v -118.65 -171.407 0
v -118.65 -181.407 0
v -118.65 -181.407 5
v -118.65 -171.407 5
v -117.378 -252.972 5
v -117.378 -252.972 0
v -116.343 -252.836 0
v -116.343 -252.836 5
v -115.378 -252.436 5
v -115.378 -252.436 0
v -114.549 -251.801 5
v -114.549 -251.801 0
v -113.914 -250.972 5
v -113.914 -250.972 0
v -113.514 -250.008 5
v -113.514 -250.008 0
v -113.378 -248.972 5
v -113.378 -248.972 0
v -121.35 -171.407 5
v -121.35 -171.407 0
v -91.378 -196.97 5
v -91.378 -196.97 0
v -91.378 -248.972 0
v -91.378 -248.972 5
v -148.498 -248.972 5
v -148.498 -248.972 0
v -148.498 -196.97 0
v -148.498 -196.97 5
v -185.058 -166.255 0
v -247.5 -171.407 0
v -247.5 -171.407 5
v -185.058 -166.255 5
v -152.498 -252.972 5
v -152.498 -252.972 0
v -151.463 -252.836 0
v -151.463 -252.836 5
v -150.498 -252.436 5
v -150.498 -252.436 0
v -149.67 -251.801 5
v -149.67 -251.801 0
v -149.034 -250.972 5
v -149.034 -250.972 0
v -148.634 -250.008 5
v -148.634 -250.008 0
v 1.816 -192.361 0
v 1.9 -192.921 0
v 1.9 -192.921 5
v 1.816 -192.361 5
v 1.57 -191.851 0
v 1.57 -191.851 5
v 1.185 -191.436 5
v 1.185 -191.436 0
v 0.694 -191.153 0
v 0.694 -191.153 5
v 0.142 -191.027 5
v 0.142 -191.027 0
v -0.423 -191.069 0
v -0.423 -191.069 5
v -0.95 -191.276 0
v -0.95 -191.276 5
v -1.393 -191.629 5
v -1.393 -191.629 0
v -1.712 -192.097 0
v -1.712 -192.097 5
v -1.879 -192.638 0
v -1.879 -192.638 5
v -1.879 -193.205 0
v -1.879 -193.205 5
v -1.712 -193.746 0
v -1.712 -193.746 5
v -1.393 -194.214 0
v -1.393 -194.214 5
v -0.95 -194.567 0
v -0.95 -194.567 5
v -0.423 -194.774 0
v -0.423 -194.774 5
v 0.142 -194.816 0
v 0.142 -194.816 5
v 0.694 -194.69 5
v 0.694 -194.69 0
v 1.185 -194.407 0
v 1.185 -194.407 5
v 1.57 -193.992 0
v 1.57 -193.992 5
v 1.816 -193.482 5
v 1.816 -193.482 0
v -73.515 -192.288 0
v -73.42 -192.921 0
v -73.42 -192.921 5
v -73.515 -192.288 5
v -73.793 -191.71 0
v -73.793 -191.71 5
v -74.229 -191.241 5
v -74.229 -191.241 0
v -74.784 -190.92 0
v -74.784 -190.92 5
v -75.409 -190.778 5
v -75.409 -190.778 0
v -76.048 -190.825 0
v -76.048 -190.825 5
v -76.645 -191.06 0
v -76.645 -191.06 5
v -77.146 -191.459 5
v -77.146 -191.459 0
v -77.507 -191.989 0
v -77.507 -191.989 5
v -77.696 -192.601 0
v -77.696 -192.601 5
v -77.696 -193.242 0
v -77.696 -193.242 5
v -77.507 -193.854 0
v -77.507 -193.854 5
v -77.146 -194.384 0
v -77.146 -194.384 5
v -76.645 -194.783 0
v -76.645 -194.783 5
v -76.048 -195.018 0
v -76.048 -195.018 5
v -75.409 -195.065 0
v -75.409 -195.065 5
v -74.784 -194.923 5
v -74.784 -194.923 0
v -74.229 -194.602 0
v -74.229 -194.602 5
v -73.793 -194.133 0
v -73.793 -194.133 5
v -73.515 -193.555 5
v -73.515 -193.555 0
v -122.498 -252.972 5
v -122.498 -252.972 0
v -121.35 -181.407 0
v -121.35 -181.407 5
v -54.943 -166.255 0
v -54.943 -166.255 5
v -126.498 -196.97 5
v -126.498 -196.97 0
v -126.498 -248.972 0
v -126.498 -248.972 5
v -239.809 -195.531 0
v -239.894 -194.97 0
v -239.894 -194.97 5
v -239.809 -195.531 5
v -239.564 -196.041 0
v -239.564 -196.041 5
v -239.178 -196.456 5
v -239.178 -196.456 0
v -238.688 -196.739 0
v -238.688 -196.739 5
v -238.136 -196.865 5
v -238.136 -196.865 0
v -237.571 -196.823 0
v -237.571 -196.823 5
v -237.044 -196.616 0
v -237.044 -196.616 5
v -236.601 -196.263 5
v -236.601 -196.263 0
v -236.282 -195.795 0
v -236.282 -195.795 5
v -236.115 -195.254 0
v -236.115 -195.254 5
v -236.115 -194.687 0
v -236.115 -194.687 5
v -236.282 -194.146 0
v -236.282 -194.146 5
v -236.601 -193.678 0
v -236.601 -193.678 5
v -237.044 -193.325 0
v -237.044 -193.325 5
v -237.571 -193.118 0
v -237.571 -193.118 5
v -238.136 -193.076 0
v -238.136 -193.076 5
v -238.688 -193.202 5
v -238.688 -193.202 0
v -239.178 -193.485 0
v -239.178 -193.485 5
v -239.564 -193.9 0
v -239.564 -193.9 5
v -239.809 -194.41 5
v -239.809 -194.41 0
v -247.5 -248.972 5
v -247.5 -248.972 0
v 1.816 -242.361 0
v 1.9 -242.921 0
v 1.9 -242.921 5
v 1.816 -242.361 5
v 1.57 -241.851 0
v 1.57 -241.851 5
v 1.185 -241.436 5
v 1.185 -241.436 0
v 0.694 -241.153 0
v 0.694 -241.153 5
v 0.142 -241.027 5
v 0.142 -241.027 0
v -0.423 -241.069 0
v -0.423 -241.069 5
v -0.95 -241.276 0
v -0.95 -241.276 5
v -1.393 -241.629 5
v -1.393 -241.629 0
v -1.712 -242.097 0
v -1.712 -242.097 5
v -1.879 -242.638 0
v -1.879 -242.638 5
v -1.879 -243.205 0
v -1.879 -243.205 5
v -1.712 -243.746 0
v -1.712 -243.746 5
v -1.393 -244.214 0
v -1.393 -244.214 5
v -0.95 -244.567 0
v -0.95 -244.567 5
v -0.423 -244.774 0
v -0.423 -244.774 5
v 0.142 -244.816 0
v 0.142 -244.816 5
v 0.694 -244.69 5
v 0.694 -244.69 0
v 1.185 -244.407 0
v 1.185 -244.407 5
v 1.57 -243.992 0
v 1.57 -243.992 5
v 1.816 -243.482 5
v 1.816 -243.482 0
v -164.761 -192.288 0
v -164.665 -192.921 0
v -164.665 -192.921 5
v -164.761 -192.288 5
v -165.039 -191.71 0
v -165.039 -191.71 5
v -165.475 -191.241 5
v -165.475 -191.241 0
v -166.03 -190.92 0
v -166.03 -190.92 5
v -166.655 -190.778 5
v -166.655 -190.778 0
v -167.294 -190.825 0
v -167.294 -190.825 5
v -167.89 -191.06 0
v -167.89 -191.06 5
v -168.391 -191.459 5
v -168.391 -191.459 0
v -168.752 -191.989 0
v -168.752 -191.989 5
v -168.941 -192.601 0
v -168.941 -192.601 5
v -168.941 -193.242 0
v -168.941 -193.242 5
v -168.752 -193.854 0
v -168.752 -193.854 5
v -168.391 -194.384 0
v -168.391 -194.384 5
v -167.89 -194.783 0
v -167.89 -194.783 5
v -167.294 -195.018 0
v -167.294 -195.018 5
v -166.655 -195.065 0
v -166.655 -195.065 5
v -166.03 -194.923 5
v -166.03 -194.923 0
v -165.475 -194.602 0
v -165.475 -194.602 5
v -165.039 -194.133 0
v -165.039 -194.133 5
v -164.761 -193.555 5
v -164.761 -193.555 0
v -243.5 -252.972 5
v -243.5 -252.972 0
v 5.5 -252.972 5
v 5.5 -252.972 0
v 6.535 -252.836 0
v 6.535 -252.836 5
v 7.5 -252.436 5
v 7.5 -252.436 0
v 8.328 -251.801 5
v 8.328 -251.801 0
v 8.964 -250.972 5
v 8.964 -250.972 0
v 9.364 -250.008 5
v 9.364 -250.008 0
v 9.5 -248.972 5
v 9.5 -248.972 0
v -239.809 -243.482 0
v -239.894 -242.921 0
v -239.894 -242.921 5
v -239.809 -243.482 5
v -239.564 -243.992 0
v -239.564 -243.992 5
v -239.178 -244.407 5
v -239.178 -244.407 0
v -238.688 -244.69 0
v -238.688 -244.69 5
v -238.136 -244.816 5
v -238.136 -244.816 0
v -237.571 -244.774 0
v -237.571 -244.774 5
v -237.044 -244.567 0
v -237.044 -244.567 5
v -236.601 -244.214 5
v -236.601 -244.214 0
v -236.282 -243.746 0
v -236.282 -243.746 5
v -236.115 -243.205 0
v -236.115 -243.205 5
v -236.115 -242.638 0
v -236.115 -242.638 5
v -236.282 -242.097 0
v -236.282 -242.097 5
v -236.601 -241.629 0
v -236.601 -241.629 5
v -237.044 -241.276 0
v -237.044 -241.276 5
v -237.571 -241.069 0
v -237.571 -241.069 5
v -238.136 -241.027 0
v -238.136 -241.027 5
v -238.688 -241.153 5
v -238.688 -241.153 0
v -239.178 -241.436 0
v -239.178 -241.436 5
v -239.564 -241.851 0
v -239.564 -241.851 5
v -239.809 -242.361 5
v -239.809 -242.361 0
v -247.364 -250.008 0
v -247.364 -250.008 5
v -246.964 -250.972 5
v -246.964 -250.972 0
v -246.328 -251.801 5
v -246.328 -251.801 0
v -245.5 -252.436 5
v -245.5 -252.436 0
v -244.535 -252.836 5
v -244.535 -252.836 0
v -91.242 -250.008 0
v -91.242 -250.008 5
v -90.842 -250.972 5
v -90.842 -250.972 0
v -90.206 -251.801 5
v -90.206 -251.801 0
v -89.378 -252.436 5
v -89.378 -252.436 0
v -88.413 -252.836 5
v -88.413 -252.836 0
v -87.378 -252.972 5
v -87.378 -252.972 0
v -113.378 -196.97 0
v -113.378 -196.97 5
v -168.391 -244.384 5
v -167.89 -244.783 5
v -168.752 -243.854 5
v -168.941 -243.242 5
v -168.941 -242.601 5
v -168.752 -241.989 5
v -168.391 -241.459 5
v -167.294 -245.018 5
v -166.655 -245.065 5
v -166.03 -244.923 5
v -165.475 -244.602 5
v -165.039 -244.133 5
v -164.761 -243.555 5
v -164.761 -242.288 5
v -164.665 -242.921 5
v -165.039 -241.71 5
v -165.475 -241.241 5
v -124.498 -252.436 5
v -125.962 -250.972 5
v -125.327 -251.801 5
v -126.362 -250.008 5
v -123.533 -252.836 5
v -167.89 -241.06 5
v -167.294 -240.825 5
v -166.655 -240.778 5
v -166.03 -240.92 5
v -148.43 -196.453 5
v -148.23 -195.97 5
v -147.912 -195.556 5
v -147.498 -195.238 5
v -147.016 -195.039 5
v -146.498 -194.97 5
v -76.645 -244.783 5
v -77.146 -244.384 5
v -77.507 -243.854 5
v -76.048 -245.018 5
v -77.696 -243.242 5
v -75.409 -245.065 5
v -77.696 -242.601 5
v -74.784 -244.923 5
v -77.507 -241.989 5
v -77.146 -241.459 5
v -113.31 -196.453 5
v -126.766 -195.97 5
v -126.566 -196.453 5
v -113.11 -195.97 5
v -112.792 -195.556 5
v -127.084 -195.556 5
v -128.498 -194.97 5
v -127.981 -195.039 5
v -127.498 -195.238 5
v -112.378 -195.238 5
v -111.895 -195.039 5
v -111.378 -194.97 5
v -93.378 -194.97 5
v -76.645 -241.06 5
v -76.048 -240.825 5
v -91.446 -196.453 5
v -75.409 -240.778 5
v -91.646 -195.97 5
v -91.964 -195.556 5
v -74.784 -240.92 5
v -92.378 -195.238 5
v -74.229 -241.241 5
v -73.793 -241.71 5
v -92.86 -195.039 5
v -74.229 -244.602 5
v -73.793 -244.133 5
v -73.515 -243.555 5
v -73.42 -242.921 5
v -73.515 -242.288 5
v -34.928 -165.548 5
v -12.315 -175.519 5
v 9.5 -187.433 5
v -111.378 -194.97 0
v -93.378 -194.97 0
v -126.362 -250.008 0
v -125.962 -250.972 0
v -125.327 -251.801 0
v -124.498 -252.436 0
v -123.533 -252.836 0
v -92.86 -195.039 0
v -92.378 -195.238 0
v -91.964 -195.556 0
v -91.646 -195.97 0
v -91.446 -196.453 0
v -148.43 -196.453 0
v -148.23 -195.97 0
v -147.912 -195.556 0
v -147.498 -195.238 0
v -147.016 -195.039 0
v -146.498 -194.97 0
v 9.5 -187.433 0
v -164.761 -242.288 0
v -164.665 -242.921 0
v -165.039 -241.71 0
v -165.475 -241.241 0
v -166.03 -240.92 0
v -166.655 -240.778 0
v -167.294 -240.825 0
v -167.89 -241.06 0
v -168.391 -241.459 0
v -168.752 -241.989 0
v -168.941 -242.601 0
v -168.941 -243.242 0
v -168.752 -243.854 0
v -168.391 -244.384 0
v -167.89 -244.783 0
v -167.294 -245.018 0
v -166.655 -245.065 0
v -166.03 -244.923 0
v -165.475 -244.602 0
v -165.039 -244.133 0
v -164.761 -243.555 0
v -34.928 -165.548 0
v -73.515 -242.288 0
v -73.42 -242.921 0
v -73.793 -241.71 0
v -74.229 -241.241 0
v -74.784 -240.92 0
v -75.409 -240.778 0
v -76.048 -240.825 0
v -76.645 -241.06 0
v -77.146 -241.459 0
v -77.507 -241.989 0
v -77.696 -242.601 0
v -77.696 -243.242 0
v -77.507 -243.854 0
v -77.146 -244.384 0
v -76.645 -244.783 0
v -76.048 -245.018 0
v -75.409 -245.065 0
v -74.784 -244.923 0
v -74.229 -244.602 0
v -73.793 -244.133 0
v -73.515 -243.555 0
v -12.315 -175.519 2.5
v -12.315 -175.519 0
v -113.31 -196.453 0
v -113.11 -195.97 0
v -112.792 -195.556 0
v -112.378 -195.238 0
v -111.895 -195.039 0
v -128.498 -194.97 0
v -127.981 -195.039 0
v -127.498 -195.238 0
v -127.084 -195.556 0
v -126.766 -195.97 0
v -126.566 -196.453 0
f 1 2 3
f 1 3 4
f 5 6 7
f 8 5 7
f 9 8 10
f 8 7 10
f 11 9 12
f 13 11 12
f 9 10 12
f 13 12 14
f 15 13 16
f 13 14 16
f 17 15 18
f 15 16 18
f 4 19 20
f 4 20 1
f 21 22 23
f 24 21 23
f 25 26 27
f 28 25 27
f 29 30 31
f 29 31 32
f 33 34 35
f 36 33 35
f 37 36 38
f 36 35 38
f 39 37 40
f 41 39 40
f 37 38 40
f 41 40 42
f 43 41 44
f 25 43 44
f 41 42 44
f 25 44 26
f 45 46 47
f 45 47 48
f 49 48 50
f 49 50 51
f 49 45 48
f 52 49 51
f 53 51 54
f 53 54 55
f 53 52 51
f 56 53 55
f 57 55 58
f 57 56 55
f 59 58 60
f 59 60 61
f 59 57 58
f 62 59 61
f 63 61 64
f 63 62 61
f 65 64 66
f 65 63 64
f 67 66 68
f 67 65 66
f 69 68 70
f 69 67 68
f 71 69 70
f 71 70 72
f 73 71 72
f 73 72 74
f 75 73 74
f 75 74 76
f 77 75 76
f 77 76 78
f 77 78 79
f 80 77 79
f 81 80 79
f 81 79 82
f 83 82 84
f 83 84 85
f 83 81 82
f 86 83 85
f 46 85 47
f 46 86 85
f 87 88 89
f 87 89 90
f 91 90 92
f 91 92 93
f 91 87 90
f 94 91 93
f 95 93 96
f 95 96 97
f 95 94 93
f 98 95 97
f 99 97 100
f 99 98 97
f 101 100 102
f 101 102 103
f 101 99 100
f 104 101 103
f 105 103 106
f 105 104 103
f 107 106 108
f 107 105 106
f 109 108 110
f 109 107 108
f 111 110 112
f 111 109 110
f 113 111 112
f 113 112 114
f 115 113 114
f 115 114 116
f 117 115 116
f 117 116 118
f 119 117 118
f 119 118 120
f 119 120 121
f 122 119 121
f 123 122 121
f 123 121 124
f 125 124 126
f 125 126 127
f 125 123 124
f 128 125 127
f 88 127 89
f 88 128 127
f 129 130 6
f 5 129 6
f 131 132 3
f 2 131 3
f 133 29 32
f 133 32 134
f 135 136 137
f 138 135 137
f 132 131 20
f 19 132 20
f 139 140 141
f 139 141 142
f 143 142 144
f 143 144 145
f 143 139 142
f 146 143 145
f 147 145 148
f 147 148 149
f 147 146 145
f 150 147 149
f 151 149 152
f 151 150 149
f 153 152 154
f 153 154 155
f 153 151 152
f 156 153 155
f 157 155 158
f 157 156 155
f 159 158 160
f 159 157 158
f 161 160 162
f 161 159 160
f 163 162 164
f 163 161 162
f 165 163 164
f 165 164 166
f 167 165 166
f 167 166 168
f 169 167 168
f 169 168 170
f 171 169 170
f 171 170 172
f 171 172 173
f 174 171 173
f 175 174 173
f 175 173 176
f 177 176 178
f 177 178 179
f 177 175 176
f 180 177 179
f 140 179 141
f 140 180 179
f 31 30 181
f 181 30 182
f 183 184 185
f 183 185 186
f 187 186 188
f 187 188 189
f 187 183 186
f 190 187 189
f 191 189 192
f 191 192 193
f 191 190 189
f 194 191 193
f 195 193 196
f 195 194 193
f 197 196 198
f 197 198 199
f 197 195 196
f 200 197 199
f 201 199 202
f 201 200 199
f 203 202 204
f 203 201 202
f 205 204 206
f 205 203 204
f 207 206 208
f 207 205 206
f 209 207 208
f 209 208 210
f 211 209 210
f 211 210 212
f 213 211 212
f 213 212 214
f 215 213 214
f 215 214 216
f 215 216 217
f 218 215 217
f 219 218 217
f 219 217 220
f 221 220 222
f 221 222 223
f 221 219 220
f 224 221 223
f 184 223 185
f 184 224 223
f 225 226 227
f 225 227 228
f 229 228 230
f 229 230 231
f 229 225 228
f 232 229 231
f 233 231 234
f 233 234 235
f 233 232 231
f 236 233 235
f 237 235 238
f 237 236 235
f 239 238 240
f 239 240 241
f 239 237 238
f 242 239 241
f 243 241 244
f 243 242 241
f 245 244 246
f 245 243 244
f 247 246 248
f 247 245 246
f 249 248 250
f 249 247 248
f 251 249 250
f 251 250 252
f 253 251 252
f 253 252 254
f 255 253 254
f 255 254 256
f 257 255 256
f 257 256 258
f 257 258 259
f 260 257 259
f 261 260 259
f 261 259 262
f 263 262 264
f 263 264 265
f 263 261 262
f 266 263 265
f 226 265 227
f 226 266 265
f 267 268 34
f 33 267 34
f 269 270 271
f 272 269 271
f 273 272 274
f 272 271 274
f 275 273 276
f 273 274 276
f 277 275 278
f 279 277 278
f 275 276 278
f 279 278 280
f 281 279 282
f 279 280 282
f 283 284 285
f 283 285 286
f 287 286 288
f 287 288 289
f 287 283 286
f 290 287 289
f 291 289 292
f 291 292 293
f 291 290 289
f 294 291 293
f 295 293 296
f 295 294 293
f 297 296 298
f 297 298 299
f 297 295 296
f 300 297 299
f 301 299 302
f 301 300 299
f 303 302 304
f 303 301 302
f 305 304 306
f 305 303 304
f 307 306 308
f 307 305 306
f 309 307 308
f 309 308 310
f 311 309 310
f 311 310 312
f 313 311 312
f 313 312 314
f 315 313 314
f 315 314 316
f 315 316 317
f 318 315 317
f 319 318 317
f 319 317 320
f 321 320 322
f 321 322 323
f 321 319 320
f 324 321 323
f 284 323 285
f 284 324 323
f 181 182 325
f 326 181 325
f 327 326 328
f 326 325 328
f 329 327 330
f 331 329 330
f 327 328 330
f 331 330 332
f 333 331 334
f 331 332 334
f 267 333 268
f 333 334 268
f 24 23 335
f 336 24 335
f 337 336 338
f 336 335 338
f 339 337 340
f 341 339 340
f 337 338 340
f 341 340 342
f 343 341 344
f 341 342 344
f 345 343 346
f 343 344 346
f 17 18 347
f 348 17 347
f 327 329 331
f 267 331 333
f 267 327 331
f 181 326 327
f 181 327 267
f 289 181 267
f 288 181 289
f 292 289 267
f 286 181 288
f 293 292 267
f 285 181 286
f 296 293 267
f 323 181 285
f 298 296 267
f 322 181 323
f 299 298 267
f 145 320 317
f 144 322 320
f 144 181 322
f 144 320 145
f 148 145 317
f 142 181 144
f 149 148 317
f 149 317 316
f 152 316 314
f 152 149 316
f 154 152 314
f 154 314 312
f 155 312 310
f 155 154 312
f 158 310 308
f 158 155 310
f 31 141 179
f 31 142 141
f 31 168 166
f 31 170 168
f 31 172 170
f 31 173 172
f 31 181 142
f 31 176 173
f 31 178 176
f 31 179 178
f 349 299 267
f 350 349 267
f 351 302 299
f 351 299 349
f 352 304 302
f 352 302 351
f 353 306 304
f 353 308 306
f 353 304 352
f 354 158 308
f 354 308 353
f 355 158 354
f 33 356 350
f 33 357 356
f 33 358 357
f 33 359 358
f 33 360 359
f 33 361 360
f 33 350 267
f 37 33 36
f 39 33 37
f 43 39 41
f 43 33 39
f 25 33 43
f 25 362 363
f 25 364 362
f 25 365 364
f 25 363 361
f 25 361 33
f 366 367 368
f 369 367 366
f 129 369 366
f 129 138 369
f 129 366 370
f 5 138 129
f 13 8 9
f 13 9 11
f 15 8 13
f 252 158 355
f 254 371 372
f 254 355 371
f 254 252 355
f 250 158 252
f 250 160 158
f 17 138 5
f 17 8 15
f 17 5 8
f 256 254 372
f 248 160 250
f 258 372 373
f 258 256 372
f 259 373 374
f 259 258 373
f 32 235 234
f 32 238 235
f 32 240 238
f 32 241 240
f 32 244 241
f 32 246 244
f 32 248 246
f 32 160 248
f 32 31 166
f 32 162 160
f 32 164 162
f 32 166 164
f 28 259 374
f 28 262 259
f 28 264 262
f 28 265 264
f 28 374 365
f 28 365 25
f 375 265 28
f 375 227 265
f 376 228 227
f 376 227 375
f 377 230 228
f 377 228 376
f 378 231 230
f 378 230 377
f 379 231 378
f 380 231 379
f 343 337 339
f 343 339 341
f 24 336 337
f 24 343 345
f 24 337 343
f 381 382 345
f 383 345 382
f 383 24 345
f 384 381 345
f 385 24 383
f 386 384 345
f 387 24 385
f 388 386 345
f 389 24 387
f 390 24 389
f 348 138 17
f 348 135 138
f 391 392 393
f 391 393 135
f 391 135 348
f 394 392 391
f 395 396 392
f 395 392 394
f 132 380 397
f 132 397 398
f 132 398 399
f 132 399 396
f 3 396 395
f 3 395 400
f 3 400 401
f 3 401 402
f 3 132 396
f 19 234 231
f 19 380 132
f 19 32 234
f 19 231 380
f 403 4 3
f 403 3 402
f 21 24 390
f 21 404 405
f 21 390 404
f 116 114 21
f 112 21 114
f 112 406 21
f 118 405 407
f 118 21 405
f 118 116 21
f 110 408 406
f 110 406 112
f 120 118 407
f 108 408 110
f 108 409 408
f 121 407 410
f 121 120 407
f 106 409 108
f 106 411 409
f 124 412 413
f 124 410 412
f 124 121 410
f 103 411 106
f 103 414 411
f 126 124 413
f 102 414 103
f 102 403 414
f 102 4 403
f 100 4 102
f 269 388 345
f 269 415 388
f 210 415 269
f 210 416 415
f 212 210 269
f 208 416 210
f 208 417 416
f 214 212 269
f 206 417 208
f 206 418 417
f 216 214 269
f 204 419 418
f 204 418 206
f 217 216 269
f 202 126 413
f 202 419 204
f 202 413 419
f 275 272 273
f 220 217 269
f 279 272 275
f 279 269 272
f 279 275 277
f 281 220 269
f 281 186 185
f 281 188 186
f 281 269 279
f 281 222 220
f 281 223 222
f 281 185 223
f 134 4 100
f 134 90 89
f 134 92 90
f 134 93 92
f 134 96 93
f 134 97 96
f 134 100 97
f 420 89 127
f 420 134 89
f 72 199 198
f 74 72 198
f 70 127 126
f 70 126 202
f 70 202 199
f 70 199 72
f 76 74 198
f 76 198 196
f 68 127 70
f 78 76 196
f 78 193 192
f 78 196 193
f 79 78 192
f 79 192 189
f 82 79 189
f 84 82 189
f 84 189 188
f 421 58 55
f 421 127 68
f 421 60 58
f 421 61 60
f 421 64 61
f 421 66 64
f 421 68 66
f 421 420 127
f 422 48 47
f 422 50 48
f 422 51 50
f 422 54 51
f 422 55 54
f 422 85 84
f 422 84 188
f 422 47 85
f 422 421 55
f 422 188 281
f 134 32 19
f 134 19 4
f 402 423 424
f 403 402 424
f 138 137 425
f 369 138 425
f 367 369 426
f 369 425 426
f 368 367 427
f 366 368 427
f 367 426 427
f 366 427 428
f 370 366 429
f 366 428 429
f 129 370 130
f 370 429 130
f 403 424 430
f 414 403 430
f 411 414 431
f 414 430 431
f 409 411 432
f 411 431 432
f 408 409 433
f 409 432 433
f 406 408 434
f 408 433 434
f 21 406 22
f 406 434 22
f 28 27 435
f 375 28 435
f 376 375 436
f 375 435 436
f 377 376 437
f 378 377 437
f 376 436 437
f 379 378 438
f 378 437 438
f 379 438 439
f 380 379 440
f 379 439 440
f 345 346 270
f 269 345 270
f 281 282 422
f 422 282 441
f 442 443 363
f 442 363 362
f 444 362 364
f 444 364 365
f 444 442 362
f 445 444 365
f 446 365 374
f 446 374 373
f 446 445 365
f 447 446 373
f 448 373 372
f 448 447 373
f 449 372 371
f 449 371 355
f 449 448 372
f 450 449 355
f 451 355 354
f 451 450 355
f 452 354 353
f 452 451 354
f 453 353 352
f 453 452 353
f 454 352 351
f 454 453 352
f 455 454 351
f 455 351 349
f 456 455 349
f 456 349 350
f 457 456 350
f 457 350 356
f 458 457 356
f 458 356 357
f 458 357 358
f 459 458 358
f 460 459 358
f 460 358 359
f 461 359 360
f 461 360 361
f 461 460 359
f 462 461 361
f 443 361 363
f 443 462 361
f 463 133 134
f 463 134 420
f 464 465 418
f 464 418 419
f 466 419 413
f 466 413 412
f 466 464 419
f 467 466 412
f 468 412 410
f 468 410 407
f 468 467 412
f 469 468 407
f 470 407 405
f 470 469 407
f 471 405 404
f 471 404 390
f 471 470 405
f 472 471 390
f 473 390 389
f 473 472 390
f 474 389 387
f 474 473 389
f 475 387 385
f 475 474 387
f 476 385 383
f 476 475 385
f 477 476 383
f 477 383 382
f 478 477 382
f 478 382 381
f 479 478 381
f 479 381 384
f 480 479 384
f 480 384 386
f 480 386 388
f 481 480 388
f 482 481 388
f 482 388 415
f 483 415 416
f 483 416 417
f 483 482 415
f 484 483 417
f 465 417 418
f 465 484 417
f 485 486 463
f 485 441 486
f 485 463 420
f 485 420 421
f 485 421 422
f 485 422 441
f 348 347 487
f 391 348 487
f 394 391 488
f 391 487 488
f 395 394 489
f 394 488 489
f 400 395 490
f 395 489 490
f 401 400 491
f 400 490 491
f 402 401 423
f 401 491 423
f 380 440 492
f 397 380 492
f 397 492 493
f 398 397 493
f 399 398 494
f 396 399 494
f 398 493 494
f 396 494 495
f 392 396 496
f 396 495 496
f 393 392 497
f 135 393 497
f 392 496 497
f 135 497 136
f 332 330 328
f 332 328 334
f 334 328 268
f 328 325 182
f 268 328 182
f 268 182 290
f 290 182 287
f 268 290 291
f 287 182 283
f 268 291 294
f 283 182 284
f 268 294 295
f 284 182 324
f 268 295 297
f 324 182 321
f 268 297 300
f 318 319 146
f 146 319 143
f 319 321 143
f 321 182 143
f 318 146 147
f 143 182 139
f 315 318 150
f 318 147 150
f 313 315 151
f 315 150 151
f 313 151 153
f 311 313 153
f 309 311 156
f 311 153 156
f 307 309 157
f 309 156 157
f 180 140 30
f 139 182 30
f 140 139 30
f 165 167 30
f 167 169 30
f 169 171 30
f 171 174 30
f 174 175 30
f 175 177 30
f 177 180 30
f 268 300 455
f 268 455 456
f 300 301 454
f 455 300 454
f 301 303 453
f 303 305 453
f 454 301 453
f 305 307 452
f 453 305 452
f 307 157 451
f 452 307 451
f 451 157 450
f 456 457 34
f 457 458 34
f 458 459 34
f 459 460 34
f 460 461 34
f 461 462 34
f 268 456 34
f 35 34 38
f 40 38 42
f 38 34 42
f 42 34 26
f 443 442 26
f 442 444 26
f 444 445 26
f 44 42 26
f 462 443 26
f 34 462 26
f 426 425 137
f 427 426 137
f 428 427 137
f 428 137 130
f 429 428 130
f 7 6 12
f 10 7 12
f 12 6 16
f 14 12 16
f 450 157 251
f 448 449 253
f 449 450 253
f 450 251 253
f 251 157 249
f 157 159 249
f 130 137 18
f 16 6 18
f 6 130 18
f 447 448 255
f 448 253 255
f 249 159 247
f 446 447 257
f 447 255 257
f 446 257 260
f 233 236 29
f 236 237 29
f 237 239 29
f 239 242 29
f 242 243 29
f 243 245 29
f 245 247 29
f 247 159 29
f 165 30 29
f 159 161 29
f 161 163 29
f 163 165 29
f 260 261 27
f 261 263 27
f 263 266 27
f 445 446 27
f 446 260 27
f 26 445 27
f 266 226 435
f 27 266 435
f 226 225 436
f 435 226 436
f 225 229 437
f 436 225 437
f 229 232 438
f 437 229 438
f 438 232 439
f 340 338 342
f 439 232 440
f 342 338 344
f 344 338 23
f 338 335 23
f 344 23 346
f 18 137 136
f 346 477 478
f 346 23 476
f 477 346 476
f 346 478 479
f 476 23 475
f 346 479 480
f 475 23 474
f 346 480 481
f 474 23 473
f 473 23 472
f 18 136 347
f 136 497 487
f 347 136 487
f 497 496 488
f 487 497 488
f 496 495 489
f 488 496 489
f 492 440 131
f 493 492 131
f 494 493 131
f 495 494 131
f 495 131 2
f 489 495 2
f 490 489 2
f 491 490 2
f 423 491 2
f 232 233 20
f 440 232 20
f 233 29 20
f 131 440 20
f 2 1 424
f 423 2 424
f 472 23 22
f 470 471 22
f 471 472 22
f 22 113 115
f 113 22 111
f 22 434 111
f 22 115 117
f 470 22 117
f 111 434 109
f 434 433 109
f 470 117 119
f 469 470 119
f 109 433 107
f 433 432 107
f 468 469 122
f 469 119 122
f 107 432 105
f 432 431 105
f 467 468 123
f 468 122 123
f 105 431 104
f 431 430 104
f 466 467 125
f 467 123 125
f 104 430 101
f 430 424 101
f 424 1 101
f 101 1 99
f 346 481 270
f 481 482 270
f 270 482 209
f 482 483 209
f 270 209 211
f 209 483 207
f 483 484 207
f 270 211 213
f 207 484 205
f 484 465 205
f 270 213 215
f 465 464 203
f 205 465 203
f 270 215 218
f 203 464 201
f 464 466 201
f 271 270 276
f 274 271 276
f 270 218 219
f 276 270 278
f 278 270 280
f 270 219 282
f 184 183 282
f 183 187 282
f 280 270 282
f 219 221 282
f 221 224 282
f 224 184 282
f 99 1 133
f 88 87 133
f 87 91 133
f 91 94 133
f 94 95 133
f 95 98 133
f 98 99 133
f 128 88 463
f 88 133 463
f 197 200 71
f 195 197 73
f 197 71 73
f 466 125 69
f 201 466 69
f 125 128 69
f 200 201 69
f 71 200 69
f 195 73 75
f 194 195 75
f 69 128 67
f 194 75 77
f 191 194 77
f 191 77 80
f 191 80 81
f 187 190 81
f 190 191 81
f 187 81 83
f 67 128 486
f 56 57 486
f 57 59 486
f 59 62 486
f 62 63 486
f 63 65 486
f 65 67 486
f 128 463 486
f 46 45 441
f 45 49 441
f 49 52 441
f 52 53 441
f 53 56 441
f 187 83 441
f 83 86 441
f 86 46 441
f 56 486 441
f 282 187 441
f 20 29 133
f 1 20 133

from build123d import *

# Parameters (mm, degrees)
SKETCH1_R           = 1.9
SKETCH1_R_2         = 2.15
SKETCH1_W           = 2.7
SKETCH1_H           = 10
BOSS_EXTRUDE1_DEPTH = 5
BOSS_EXTRUDE2_DEPTH = 5
CUT_EXTRUDE1_DEPTH  = 5


with BuildPart() as part:
    # Sketch1 → Boss-Extrude1 (new body)
    with BuildSketch(Plane.XY):
        with BuildLine():
            Line((-243.5, -252.972288794), (-152.498180394, -252.972288794))
            ThreePointArc((-152.498180394, -252.972288794), (-149.669753269, -251.800715919), (-148.498180394, -248.972288794))
            Line((-148.498180394, -248.972288794), (-148.498180394, -196.970492539))
            ThreePointArc((-148.498180394, -196.970492539), (-147.912393957, -195.556278976), (-146.498180394, -194.970492539))
            Line((-146.498180394, -194.970492539), (-128.498180394, -194.970492539))
            ThreePointArc((-128.498180394, -194.970492539), (-127.083966832, -195.556278976), (-126.498180394, -196.970492539))
            Line((-126.498180394, -196.970492539), (-126.498180394, -248.972288794))
            ThreePointArc((-126.498180394, -248.972288794), (-125.326607519, -251.800715919), (-122.498180394, -252.972288794))
            Line((-122.498180394, -252.972288794), (-117.377838381, -252.972288794))
            ThreePointArc((-117.377838381, -252.972288794), (-114.549411256, -251.800715919), (-113.377838381, -248.972288794))
            Line((-113.377838381, -248.972288794), (-113.377838381, -196.970492539))
            ThreePointArc((-113.377838381, -196.970492539), (-112.792051943, -195.556278976), (-111.377838381, -194.970492539))
            Line((-111.377838381, -194.970492539), (-93.377838381, -194.970492539))
            ThreePointArc((-93.377838381, -194.970492539), (-91.963624819, -195.556278976), (-91.377838381, -196.970492539))
            Line((-91.377838381, -196.970492539), (-91.377838381, -248.972288794))
            ThreePointArc((-91.377838381, -248.972288794), (-90.206265506, -251.800715919), (-87.377838381, -252.972288794))
            Line((-87.377838381, -252.972288794), (5.5, -252.972288794))
            ThreePointArc((5.5, -252.972288794), (8.328427125, -251.800715919), (9.5, -248.972288794))
            Line((9.5, -248.972288794), (9.5, -187.432851256))
            add(Edge.make_bspline(
                [(-75.569581097, -152.972288794), (-30.278898356, -163.497720658), (9.5, -187.432851256)],
                knots=[0, 0, 0, 1, 1, 1], degree=2))
            Line((-75.569581097, -152.972288794), (-118.65, -152.972288794))
            Line((-118.65, -152.972288794), (-118.65, -162.972288794))
            Line((-118.65, -162.972288794), (-121.35, -162.972288794))
            Line((-121.35, -162.972288794), (-121.35, -152.972288794))
            Line((-121.35, -152.972288794), (-164.430418903, -152.972288794))
            add(Edge.make_bspline(
                [(-164.430418903, -152.972288794), (-207.794171984, -154.134737544), (-247.5, -171.407059989)],
                knots=[0, 0, 0, 1, 1, 1], degree=2))
            Line((-247.5, -171.407059989), (-247.5, -248.972288794))
            ThreePointArc((-247.5, -248.972288794), (-246.328427125, -251.800715919), (-243.5, -252.972288794))
        make_face()
        with Locations((0, -192.921490239)):
            Circle(SKETCH1_R, mode=Mode.SUBTRACT)
        with Locations((0, -242.921490239)):
            Circle(SKETCH1_R, mode=Mode.SUBTRACT)
        with Locations((-237.993794987, -242.921490239)):
            Circle(SKETCH1_R, mode=Mode.SUBTRACT)
        with Locations((-237.993794987, -194.970492539)):
            Circle(SKETCH1_R, mode=Mode.SUBTRACT)
        with Locations((-166.815366628, -192.921490239)):
            Circle(SKETCH1_R_2, mode=Mode.SUBTRACT)
        with Locations((-166.815366628, -242.921490239)):
            Circle(SKETCH1_R_2, mode=Mode.SUBTRACT)
        with Locations((-75.569581097, -192.921490239)):
            Circle(SKETCH1_R_2, mode=Mode.SUBTRACT)
        with Locations((-75.569581097, -242.921490239)):
            Circle(SKETCH1_R_2, mode=Mode.SUBTRACT)
        with Locations((-120, -176.407059989)):
            Rectangle(SKETCH1_W, SKETCH1_H, mode=Mode.SUBTRACT)
    extrude(amount=BOSS_EXTRUDE1_DEPTH)

    # Sketch2 → Boss-Extrude2 (add)
    with BuildSketch(Plane(origin=(0, 0, 0), x_dir=(-1, 0, 0), z_dir=(0, 0, -1))):
        with BuildLine():
            Line((247.500000017, -171.407059996), (185.05842867, -166.255233236))
            Line((185.05842867, -166.255233236), (54.943181018, -166.255233236))
            Line((54.943181018, -166.255233236), (34.928242723, -165.547963122))
            add(Edge.make_bspline(
                [(58.315946636, -155.801157817), (45.893296778, -158.75444176), (34.928242723, -165.547963122)],
                knots=[0, 0, 0, 1, 1, 1], degree=2))
            add(Edge.make_bspline(
                [(58.315946636, -155.801157817), (63.424678897, -156.071648314), (70.654281497, -151.741484529)],
                knots=[0, 0, 0, 0.409142446, 0.409142446, 0.409142446], degree=2))
            add(Edge.make_bspline(
                [(113.326199409, -148.857198457), (91.886453079, -148.664892877), (70.654281497, -151.741484529)],
                knots=[0, 0, 0, 1, 1, 1], degree=2))
            Line((113.326199409, -148.857198457), (126.673800592, -148.857198457))
            add(Edge.make_bspline(
                [(185.597069482, -153.384908978), (156.563126475, -146.928393886), (126.673800592, -148.857198457)],
                knots=[0, 0, 0, 1, 1, 1], degree=2))
            add(Edge.make_bspline(
                [(185.597069482, -153.384908978), (219.13818523, -148.75209862), (247.500000017, -171.407059996)],
                knots=[0, 0, 0, 1, 1, 1], degree=2))
        make_face()
    extrude(amount=-BOSS_EXTRUDE2_DEPTH)

    # Sketch2<2> → Cut-Extrude1 (cut)
    with BuildSketch(Plane(origin=(0, 0, 0), x_dir=(-1, 0, 0), z_dir=(0, 0, -1))):
        with BuildLine():
            Line((185.05842867, -166.255233236), (247.500000017, -171.407059996))
            add(Edge.make_bspline(
                [(185.597069482, -153.384908978), (219.13818523, -148.75209862), (247.500000017, -171.407059996)],
                knots=[0, 0, 0, 1, 1, 1], degree=2))
            add(Edge.make_bspline(
                [(185.597069482, -153.384908978), (156.563126475, -146.928393886), (126.673800592, -148.857198457)],
                knots=[0, 0, 0, 1, 1, 1], degree=2))
            Line((126.673800592, -148.857198457), (113.326199409, -148.857198457))
            add(Edge.make_bspline(
                [(113.326199409, -148.857198457), (91.886453079, -148.664892877), (70.654281497, -151.741484529)],
                knots=[0, 0, 0, 1, 1, 1], degree=2))
            add(Edge.make_bspline(
                [(58.315946636, -155.801157817), (63.424678897, -156.071648314), (70.654281497, -151.741484529)],
                knots=[0, 0, 0, 0.409142446, 0.409142446, 0.409142446], degree=2))
            add(Edge.make_bspline(
                [(58.315946636, -155.801157817), (45.893296778, -158.75444176), (34.928242723, -165.547963122)],
                knots=[0, 0, 0, 1, 1, 1], degree=2))
            Line((34.928242723, -165.547963122), (54.943181018, -166.255233236))
            Line((54.943181018, -166.255233236), (185.05842867, -166.255233236))
        make_face()
    extrude(amount=-CUT_EXTRUDE1_DEPTH, mode=Mode.SUBTRACT)


solid = part.part
